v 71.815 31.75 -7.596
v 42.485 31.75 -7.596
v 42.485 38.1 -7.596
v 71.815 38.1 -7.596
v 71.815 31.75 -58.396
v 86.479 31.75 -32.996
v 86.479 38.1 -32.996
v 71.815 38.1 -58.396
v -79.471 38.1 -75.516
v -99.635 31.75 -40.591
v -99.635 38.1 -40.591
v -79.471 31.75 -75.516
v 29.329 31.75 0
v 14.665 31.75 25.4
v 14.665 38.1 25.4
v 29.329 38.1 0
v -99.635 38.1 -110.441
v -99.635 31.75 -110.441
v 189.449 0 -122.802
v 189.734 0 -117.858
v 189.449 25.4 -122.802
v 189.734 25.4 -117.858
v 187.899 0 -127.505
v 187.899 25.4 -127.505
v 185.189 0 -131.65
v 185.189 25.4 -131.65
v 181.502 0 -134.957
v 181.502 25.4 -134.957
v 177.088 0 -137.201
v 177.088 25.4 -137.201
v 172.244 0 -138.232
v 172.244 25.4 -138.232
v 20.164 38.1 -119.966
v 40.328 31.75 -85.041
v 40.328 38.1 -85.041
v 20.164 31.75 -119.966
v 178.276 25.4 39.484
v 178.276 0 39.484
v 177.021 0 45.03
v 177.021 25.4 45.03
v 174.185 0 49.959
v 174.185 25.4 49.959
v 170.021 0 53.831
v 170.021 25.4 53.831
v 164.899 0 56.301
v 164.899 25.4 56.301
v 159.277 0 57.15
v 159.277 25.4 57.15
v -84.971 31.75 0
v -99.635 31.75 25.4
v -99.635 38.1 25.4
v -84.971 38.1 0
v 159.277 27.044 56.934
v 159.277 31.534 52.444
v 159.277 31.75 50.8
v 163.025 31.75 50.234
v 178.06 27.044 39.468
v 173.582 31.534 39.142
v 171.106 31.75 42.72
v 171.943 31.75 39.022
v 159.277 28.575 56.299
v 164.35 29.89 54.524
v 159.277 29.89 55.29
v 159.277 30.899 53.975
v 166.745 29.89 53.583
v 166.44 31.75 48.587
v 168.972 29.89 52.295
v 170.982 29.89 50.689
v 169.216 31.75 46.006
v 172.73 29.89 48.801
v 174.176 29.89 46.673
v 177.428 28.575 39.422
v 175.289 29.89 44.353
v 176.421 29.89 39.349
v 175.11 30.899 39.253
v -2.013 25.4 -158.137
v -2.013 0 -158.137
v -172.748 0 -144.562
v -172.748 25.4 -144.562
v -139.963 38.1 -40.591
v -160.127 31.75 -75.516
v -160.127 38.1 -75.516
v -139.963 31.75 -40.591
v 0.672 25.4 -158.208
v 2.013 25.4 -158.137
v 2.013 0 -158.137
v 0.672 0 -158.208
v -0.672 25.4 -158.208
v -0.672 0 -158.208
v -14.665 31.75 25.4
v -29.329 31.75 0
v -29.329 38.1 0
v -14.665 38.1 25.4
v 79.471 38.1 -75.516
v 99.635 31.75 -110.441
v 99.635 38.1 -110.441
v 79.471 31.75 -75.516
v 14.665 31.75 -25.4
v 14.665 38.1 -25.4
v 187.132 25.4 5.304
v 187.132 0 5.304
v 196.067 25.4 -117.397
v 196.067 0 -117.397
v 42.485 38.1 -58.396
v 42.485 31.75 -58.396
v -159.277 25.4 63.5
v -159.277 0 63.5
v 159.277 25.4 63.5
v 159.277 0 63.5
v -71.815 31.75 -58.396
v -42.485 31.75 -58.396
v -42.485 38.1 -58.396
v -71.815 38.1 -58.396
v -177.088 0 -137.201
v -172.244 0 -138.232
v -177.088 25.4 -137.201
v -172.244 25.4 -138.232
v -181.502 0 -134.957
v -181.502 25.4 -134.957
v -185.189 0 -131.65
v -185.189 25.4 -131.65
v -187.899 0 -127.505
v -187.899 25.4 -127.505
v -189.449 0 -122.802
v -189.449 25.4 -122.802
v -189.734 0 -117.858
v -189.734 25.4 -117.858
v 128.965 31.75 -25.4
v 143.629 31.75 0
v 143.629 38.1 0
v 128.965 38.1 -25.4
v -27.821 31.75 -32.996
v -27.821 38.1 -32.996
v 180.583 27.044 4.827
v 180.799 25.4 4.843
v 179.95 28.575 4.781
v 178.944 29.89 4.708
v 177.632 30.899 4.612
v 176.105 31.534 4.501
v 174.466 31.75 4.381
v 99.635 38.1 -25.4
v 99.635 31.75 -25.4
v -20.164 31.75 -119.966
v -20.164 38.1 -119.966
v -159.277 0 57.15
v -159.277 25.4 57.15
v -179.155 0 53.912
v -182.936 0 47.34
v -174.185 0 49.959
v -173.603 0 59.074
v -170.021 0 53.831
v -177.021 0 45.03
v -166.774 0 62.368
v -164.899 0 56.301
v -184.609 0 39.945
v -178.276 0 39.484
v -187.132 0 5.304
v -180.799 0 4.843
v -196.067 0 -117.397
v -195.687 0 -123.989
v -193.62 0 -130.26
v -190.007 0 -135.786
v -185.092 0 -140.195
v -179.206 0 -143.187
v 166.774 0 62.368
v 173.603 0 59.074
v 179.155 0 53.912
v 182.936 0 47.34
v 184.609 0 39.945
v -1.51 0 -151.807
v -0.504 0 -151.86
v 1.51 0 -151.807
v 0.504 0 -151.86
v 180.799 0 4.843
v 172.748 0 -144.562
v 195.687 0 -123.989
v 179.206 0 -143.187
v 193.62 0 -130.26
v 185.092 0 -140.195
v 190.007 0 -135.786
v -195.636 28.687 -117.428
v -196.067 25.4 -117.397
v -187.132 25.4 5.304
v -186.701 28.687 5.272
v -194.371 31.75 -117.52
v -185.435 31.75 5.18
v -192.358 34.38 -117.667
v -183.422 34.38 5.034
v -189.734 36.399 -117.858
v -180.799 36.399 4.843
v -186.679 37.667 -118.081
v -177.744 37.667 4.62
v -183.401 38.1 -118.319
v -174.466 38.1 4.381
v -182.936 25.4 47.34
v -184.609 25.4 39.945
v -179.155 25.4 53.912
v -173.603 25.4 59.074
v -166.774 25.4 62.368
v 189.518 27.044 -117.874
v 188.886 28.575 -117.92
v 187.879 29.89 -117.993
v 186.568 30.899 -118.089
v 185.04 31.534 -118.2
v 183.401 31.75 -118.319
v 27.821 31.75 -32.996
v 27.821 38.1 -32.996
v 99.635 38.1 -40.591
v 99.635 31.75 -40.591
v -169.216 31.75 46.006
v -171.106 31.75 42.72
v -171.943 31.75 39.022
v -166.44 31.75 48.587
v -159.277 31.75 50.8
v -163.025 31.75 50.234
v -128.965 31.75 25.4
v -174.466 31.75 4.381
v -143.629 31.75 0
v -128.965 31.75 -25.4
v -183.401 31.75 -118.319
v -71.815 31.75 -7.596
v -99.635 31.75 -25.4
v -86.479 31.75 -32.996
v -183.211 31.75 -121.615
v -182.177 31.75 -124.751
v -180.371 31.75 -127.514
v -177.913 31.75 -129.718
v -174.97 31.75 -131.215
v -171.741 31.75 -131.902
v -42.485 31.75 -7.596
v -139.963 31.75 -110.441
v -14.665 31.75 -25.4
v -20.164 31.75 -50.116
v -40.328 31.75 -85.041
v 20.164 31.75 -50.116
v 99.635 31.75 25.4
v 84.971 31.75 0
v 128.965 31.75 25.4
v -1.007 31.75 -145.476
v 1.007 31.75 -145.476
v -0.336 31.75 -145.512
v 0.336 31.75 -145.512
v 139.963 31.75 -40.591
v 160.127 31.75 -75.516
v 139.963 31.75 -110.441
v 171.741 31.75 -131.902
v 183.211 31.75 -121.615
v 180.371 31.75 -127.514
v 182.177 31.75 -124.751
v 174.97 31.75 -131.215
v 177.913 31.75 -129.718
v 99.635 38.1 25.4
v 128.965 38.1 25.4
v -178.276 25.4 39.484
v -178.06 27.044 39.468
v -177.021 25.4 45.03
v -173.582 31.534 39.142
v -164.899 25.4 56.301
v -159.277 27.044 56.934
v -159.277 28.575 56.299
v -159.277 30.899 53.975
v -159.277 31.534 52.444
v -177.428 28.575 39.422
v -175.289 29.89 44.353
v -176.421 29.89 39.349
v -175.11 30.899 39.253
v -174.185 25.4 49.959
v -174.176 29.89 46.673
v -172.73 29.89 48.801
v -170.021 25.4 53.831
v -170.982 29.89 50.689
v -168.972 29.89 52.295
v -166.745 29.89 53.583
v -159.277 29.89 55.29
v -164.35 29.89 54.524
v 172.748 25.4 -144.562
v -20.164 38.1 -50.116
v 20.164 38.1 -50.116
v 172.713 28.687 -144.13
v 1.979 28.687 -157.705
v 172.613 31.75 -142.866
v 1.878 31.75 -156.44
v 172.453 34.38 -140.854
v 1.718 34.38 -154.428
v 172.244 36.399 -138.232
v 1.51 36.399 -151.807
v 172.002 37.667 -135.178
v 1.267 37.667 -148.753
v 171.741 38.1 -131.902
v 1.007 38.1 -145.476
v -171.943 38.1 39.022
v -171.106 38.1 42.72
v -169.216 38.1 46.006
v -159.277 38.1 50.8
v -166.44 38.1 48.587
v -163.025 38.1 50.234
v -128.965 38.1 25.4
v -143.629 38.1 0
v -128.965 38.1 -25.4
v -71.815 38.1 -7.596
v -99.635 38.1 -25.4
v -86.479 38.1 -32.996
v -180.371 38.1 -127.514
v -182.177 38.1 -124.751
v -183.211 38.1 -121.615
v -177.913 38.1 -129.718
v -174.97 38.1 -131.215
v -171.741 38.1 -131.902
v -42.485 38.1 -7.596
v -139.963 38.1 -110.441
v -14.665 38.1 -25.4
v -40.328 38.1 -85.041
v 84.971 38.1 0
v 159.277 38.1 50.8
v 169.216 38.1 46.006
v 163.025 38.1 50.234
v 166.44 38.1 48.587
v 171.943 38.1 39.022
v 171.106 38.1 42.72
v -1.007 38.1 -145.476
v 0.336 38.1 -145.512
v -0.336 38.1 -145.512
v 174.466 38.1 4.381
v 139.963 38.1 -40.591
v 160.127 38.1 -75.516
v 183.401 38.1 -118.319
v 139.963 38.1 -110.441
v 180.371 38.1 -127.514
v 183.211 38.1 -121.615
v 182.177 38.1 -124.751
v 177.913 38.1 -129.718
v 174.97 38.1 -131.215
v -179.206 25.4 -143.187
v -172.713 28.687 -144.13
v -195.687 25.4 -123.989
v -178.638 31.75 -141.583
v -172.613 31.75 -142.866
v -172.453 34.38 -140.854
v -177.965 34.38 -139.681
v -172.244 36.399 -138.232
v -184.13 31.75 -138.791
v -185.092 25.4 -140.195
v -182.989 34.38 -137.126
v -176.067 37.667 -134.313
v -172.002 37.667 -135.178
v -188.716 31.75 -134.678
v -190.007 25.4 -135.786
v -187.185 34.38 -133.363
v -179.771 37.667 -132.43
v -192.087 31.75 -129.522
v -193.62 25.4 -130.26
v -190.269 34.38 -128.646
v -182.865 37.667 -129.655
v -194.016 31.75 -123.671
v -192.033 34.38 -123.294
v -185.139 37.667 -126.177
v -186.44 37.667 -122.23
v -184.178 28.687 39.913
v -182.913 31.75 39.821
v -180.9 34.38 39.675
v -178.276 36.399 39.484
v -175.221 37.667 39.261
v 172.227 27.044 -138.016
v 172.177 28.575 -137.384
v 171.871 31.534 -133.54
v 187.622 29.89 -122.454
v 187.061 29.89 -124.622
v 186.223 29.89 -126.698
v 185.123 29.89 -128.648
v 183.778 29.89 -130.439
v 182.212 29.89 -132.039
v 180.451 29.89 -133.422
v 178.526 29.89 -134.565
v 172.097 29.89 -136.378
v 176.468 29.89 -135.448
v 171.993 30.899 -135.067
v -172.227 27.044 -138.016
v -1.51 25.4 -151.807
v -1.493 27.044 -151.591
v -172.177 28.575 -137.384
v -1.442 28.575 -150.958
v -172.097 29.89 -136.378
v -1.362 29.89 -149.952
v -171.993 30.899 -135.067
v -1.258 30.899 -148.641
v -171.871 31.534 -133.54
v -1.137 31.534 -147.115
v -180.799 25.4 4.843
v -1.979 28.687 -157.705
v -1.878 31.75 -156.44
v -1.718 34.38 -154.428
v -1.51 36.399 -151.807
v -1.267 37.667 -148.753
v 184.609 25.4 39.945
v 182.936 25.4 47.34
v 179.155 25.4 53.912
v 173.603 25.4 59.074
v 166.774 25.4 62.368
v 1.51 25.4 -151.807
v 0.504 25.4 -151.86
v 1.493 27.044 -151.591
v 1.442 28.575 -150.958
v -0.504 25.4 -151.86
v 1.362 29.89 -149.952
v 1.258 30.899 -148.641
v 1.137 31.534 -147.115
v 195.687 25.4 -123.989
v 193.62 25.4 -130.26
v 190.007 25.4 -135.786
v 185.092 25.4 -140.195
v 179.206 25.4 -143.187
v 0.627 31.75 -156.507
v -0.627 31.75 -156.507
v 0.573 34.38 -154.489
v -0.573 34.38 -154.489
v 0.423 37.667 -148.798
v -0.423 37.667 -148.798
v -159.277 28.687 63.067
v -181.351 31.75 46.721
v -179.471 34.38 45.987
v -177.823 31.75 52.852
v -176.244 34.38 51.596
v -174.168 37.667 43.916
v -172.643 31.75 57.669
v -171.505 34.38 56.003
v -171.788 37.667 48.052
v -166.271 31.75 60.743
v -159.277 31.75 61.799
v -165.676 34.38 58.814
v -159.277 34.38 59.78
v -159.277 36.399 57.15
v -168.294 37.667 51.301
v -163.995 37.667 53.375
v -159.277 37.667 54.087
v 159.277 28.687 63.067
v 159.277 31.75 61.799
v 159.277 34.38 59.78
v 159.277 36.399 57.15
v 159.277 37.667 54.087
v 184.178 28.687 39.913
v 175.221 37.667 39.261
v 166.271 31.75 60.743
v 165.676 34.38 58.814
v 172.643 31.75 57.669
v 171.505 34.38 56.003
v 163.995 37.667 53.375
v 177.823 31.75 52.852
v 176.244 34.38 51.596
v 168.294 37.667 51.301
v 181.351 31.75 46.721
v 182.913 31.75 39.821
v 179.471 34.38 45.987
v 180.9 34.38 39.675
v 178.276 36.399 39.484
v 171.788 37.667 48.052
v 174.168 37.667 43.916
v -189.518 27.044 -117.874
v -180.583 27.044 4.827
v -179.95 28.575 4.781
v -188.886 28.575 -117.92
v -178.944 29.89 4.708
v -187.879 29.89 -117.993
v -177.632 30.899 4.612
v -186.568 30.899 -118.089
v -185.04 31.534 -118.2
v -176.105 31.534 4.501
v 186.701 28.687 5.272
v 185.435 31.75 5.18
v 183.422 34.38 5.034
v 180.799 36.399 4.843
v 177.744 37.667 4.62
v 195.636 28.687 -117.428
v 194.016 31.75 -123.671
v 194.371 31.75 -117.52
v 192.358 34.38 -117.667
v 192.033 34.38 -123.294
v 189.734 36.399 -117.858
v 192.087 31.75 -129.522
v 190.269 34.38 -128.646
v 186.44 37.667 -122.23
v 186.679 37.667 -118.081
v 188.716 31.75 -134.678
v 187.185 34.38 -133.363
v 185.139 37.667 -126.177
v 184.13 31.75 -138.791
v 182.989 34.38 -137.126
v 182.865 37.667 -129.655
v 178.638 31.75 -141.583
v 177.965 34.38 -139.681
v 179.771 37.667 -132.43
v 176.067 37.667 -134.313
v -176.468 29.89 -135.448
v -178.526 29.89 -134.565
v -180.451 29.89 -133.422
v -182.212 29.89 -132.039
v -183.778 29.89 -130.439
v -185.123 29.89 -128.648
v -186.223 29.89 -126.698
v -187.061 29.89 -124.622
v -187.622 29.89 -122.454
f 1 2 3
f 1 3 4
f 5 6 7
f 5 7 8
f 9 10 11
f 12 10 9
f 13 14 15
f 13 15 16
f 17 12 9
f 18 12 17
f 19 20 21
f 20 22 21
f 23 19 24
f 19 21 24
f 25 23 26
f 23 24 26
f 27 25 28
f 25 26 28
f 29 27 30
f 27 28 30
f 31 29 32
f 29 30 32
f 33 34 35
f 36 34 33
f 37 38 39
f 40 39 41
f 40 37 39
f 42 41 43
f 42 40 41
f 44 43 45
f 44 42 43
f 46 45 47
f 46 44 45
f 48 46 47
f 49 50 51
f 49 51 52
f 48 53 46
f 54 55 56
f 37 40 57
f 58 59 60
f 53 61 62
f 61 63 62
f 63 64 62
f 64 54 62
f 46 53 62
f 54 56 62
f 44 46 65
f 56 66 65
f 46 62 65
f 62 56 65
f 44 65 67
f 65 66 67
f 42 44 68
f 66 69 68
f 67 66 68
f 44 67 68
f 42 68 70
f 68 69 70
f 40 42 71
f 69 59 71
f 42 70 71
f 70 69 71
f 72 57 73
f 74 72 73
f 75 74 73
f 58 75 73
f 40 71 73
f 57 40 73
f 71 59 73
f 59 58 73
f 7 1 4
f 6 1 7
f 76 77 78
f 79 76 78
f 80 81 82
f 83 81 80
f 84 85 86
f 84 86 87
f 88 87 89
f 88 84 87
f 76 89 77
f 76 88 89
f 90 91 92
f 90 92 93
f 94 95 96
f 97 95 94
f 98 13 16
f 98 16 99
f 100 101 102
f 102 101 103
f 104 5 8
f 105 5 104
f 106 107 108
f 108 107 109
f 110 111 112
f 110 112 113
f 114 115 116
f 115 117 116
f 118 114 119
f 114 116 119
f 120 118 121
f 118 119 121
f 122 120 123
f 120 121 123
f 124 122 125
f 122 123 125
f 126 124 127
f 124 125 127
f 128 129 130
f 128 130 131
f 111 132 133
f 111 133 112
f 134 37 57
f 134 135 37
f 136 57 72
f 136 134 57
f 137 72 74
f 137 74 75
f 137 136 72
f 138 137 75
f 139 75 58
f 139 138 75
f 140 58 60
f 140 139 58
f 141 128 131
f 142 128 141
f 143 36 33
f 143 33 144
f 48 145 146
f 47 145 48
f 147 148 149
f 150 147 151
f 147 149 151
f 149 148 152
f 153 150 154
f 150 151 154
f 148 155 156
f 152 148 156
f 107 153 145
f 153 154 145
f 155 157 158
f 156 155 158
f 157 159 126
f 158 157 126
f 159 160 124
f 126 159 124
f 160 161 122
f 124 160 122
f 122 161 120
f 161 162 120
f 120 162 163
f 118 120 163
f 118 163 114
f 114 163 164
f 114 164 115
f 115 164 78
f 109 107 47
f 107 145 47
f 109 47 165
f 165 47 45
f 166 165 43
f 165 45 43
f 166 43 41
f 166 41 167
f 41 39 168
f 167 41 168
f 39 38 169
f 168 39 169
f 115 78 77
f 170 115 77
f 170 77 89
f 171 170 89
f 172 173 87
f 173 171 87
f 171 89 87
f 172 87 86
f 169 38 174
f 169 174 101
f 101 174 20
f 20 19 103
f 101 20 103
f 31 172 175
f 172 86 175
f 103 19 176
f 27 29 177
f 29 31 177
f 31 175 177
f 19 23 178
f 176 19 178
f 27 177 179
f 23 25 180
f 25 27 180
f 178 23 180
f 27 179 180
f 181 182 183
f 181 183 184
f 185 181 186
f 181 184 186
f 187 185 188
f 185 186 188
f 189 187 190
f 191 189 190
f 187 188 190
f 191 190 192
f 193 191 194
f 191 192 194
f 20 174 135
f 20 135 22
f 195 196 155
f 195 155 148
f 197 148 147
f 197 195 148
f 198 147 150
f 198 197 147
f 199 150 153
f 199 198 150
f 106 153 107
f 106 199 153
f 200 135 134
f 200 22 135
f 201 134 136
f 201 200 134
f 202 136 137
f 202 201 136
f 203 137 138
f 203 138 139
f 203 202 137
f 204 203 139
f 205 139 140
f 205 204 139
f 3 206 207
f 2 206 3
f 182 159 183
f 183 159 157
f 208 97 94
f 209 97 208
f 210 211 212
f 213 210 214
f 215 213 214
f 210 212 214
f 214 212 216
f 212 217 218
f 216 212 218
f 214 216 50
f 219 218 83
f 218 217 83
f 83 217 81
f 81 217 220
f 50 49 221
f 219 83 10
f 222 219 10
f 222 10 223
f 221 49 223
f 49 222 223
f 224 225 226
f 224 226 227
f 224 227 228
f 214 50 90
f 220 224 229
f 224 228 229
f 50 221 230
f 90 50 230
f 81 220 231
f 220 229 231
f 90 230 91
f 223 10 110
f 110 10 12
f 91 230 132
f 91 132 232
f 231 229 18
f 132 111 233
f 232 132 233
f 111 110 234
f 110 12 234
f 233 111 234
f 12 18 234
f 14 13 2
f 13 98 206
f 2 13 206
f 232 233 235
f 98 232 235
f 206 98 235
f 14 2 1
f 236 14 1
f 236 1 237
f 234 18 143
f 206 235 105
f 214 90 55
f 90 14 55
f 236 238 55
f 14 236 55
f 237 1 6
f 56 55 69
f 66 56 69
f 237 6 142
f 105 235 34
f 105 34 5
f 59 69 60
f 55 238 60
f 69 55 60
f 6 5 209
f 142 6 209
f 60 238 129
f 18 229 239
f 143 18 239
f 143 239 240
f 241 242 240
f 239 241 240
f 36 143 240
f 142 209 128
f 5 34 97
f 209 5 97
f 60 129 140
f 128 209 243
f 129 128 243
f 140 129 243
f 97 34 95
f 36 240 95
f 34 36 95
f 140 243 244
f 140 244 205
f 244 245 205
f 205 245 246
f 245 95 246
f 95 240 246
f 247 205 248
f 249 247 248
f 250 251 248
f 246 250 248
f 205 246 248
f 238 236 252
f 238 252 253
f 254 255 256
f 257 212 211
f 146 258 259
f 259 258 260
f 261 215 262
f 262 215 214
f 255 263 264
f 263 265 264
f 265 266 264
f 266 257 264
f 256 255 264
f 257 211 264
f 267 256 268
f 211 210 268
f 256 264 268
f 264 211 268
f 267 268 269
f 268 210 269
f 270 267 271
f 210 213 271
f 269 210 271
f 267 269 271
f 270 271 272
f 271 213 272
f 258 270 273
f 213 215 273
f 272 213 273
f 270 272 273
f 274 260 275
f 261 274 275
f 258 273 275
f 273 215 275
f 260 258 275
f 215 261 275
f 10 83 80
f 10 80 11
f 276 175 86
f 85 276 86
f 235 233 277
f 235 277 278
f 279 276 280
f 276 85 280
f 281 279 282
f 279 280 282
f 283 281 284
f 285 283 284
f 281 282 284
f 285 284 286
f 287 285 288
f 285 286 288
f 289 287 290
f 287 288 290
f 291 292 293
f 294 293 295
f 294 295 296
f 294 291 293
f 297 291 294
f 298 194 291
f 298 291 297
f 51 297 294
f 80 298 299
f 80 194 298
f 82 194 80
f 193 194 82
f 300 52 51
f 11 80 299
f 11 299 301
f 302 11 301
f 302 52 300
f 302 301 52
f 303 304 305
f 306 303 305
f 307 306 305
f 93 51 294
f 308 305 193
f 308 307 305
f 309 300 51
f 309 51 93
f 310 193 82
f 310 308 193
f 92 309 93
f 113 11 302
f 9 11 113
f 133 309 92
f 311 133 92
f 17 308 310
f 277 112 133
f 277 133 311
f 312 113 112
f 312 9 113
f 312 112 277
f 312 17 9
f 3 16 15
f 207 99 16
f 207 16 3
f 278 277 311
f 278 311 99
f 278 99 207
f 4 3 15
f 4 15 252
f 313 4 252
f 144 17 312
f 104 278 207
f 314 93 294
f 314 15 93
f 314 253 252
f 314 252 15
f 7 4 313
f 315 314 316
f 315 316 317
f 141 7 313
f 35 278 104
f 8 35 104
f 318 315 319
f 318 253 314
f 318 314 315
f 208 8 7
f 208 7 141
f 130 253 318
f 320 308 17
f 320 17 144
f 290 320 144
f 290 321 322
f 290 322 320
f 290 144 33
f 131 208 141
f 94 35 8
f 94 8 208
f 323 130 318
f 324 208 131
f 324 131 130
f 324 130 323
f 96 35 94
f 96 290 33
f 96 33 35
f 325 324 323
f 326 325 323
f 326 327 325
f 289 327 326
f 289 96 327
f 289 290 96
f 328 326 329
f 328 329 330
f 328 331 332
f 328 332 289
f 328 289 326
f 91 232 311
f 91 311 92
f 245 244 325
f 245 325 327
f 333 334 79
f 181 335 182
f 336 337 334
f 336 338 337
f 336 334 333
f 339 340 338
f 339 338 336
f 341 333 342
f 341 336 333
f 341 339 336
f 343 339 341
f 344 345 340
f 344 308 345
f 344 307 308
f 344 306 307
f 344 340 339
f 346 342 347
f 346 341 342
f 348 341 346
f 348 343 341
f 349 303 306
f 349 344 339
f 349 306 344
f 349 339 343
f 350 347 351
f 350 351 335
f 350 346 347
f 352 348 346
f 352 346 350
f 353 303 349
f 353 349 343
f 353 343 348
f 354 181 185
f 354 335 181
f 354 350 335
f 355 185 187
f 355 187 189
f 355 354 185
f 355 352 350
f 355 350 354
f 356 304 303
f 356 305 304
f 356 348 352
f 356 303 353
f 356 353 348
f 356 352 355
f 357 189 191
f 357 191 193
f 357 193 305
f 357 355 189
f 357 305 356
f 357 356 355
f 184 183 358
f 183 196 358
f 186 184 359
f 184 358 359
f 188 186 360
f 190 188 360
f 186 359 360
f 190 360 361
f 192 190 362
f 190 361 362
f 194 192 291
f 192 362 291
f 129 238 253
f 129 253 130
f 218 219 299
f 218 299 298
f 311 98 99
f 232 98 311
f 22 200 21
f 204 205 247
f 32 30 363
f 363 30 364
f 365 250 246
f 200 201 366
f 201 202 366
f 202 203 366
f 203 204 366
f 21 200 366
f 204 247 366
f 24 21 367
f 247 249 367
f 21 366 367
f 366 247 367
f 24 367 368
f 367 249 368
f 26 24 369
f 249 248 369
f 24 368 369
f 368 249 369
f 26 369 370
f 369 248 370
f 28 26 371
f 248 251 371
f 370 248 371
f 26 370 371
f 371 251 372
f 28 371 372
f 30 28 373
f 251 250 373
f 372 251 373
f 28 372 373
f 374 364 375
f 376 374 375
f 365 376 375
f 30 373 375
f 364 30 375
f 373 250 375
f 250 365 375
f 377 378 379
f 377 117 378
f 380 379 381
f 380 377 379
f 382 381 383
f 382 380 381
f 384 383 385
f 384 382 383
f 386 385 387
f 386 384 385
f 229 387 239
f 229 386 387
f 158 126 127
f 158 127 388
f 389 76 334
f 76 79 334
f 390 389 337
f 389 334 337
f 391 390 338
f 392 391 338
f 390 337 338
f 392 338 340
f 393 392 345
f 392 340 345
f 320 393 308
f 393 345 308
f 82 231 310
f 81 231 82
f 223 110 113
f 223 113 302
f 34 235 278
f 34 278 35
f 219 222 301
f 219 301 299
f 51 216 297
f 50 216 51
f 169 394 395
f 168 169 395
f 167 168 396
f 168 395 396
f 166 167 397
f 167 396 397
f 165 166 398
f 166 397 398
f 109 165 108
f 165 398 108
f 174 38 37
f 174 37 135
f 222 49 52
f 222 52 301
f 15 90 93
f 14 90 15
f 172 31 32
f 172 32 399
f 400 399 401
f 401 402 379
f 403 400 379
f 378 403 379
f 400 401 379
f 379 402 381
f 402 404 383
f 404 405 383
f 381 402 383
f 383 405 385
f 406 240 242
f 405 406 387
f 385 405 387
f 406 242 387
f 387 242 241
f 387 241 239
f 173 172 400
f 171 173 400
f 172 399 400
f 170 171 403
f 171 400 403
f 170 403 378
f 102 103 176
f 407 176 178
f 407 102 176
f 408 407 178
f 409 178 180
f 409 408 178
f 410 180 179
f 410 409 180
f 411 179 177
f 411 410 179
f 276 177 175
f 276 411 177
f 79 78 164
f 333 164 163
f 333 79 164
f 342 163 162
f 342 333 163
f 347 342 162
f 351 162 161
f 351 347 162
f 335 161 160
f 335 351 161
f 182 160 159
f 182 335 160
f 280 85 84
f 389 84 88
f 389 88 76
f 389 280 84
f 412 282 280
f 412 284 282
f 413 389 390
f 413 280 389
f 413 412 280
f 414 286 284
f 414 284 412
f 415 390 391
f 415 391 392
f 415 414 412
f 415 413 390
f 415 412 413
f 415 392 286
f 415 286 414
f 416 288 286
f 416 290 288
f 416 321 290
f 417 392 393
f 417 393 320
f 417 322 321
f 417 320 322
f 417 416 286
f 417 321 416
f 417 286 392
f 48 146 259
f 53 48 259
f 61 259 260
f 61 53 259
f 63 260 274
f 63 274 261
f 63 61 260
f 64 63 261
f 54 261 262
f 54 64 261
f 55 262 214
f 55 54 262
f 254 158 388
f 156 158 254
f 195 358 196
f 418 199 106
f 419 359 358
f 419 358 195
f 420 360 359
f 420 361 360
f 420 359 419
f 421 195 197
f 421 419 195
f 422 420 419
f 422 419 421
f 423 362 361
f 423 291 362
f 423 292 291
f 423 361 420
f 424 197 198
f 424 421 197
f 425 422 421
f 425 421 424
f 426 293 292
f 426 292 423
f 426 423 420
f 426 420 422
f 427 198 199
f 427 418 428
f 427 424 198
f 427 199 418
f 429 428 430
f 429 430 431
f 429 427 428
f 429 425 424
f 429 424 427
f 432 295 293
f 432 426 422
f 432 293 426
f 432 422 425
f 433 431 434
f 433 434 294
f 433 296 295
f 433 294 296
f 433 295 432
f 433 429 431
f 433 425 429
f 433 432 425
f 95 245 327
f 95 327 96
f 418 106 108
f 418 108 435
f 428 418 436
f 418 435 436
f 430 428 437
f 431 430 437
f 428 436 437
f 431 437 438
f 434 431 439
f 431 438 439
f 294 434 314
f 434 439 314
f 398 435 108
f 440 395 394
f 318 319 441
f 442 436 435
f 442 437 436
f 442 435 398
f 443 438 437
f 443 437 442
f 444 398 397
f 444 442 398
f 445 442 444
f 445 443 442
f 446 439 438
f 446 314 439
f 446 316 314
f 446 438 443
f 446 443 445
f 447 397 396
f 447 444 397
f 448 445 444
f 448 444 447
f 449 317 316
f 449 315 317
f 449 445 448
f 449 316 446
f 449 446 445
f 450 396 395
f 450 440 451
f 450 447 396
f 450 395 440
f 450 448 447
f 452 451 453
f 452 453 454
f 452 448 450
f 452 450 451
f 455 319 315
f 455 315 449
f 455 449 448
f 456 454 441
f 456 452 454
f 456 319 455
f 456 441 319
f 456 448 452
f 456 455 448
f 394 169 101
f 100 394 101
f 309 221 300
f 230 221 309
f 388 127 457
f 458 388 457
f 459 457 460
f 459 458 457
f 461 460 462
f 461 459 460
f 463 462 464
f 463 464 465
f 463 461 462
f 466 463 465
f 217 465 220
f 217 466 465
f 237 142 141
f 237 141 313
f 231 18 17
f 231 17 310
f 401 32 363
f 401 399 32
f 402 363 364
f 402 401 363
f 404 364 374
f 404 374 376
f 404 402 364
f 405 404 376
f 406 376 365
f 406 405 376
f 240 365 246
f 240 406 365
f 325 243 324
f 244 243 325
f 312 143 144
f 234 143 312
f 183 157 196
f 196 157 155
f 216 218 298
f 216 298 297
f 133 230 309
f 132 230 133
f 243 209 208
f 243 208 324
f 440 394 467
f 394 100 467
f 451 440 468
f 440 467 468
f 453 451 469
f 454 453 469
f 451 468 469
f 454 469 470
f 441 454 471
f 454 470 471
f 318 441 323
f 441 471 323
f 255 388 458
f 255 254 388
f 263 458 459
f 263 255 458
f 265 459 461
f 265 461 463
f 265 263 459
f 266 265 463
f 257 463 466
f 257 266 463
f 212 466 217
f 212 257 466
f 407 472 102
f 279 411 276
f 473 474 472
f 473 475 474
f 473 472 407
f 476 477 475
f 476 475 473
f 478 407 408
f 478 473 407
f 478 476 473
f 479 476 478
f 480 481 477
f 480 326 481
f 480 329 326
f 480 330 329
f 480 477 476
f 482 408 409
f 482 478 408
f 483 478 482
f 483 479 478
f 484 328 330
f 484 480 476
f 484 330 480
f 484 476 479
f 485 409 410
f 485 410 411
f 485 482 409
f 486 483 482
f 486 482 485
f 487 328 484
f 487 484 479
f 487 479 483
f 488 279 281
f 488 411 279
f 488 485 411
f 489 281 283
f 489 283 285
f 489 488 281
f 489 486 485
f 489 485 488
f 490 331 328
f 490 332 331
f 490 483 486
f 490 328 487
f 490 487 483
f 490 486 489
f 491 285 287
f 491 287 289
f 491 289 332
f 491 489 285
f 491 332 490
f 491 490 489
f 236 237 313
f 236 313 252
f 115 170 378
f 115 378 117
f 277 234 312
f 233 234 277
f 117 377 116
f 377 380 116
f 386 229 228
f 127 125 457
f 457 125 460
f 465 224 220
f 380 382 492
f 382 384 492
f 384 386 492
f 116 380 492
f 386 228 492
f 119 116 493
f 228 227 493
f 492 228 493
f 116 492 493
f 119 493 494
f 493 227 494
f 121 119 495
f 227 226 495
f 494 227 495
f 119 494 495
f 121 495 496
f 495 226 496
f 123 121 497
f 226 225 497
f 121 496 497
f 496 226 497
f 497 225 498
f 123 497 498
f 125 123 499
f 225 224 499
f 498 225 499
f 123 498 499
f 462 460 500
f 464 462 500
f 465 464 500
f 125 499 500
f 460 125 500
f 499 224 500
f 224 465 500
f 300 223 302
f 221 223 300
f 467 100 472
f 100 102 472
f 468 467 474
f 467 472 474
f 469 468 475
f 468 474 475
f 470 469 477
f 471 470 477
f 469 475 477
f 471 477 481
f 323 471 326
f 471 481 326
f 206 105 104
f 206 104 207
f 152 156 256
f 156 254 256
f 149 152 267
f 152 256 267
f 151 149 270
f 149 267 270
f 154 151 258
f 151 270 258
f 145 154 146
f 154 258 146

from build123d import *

# Parameters (mm, degrees)
BOSS_EXTRUDE1_DEPTH     = 38.1
FILLET1_R               = 25.4
FILLET2_R               = 12.7
SHELL1_T                = -6.35
CUT_EXTRUDE1_DEPTH      = 255.858427337
CUT_EXTRUDE1_DEPTH_BACK = 255.858427337


with BuildPart() as part:
    # Sketch1 → Boss-Extrude1 (new body)
    with BuildSketch(Plane(origin=(0, 0, 0), x_dir=(1, 0, 0), z_dir=(0, 1, 0))):
        Polygon((-114.3, -63.5), (114.3, -63.5), (182.894154879, -63.5), (187.132137575, -5.303806299), (197.900067, 142.561947658), (0, 158.296586732), (-197.900067, 142.561947658), (-187.132137575, -5.303806299), (-182.894154879, -63.5), align=None)
    extrude(amount=BOSS_EXTRUDE1_DEPTH)

    # Fillet1
    fillet1_edges = [part.edges().sort_by_distance(p)[0] for p in [
        (-182.894154879, 19.05, 63.5),
        (-197.900067, 19.05, -142.561947658),
        (0, 19.05, -158.296586732),
        (197.900067, 19.05, -142.561947658),
        (182.894154879, 19.05, 63.5),
    ]]
    fillet(fillet1_edges, radius=FILLET1_R)

    # Fillet2
    fillet2_edges = [part.edges().sort_by_distance(p)[0] for p in [
        (190.338493083, 38.1, -38.72603044),
        (0, 38.1, 63.5),
        (87.380434893, 38.1, -151.349142873),
        (-87.380434893, 38.1, -151.349142873),
        (-190.338493083, 38.1, -38.72603044),
        (-190.007212355, 38.1, -135.786308877),
        (0, 38.1, -158.216429875),
        (-176.572564505, 38.1, 56.70131683),
        (190.007212355, 38.1, -135.786308877),
        (176.572564505, 38.1, 56.70131683),
    ]]
    fillet(fillet2_edges, radius=FILLET2_R)

    # Shell1
    shell1_openings = [part.faces().sort_by_distance(p)[0] for p in [
        (0, 0, -44.95160626),
    ]]
    offset(amount=SHELL1_T, openings=shell1_openings, kind=Kind.INTERSECTION)

    # Sketch3 → Cut-Extrude1 (cut, two sides: drawn at the far end of the back side and taken through both)
    with BuildSketch(Plane(origin=(0, 38.1, 0), x_dir=(1, 0, 0), z_dir=(0, 1, 0)).offset(-CUT_EXTRUDE1_DEPTH_BACK)):
        Polygon((-128.964696837, 25.4), (-143.629393675, 0), (-128.964696837, -25.4), (-99.635303163, -25.4), (-84.970606325, 0), (-99.635303163, 25.4), align=None)
        Polygon((-27.820606325, 32.995567884), (-42.485303163, 58.395567884), (-71.814696837, 58.395567884), (-86.479393675, 32.995567884), (-71.814696837, 7.595567884), (-42.485303163, 7.595567884), align=None)
        Polygon((40.327916303, 85.041135768), (20.163958151, 119.966135768), (-20.163958151, 119.966135768), (-40.327916303, 85.041135768), (-20.163958151, 50.116135768), (20.163958151, 50.116135768), align=None)
        Polygon((29.329393675, 0), (14.664696837, 25.4), (-14.664696837, 25.4), (-29.329393675, 0), (-14.664696837, -25.4), (14.664696837, -25.4), align=None)
        Polygon((143.629393675, 0), (128.964696837, 25.4), (99.635303163, 25.4), (84.970606325, 0), (99.635303163, -25.4), (128.964696837, -25.4), align=None)
        Polygon((71.814696837, 7.595567884), (86.479393675, 32.995567884), (71.814696837, 58.395567884), (42.485303163, 58.395567884), (27.820606325, 32.995567884), (42.485303163, 7.595567884), align=None)
        Polygon((-99.635303163, 40.591135768), (-79.471345011, 75.516135768), (-99.635303163, 110.441135768), (-139.963219465, 110.441135768), (-160.127177617, 75.516135768), (-139.963219465, 40.591135768), align=None)
        Polygon((160.127177617, 75.516135768), (139.963219465, 110.441135768), (99.635303163, 110.441135768), (79.471345011, 75.516135768), (99.635303163, 40.591135768), (139.963219465, 40.591135768), align=None)
    extrude(amount=CUT_EXTRUDE1_DEPTH + CUT_EXTRUDE1_DEPTH_BACK, mode=Mode.SUBTRACT)


solid = part.part
